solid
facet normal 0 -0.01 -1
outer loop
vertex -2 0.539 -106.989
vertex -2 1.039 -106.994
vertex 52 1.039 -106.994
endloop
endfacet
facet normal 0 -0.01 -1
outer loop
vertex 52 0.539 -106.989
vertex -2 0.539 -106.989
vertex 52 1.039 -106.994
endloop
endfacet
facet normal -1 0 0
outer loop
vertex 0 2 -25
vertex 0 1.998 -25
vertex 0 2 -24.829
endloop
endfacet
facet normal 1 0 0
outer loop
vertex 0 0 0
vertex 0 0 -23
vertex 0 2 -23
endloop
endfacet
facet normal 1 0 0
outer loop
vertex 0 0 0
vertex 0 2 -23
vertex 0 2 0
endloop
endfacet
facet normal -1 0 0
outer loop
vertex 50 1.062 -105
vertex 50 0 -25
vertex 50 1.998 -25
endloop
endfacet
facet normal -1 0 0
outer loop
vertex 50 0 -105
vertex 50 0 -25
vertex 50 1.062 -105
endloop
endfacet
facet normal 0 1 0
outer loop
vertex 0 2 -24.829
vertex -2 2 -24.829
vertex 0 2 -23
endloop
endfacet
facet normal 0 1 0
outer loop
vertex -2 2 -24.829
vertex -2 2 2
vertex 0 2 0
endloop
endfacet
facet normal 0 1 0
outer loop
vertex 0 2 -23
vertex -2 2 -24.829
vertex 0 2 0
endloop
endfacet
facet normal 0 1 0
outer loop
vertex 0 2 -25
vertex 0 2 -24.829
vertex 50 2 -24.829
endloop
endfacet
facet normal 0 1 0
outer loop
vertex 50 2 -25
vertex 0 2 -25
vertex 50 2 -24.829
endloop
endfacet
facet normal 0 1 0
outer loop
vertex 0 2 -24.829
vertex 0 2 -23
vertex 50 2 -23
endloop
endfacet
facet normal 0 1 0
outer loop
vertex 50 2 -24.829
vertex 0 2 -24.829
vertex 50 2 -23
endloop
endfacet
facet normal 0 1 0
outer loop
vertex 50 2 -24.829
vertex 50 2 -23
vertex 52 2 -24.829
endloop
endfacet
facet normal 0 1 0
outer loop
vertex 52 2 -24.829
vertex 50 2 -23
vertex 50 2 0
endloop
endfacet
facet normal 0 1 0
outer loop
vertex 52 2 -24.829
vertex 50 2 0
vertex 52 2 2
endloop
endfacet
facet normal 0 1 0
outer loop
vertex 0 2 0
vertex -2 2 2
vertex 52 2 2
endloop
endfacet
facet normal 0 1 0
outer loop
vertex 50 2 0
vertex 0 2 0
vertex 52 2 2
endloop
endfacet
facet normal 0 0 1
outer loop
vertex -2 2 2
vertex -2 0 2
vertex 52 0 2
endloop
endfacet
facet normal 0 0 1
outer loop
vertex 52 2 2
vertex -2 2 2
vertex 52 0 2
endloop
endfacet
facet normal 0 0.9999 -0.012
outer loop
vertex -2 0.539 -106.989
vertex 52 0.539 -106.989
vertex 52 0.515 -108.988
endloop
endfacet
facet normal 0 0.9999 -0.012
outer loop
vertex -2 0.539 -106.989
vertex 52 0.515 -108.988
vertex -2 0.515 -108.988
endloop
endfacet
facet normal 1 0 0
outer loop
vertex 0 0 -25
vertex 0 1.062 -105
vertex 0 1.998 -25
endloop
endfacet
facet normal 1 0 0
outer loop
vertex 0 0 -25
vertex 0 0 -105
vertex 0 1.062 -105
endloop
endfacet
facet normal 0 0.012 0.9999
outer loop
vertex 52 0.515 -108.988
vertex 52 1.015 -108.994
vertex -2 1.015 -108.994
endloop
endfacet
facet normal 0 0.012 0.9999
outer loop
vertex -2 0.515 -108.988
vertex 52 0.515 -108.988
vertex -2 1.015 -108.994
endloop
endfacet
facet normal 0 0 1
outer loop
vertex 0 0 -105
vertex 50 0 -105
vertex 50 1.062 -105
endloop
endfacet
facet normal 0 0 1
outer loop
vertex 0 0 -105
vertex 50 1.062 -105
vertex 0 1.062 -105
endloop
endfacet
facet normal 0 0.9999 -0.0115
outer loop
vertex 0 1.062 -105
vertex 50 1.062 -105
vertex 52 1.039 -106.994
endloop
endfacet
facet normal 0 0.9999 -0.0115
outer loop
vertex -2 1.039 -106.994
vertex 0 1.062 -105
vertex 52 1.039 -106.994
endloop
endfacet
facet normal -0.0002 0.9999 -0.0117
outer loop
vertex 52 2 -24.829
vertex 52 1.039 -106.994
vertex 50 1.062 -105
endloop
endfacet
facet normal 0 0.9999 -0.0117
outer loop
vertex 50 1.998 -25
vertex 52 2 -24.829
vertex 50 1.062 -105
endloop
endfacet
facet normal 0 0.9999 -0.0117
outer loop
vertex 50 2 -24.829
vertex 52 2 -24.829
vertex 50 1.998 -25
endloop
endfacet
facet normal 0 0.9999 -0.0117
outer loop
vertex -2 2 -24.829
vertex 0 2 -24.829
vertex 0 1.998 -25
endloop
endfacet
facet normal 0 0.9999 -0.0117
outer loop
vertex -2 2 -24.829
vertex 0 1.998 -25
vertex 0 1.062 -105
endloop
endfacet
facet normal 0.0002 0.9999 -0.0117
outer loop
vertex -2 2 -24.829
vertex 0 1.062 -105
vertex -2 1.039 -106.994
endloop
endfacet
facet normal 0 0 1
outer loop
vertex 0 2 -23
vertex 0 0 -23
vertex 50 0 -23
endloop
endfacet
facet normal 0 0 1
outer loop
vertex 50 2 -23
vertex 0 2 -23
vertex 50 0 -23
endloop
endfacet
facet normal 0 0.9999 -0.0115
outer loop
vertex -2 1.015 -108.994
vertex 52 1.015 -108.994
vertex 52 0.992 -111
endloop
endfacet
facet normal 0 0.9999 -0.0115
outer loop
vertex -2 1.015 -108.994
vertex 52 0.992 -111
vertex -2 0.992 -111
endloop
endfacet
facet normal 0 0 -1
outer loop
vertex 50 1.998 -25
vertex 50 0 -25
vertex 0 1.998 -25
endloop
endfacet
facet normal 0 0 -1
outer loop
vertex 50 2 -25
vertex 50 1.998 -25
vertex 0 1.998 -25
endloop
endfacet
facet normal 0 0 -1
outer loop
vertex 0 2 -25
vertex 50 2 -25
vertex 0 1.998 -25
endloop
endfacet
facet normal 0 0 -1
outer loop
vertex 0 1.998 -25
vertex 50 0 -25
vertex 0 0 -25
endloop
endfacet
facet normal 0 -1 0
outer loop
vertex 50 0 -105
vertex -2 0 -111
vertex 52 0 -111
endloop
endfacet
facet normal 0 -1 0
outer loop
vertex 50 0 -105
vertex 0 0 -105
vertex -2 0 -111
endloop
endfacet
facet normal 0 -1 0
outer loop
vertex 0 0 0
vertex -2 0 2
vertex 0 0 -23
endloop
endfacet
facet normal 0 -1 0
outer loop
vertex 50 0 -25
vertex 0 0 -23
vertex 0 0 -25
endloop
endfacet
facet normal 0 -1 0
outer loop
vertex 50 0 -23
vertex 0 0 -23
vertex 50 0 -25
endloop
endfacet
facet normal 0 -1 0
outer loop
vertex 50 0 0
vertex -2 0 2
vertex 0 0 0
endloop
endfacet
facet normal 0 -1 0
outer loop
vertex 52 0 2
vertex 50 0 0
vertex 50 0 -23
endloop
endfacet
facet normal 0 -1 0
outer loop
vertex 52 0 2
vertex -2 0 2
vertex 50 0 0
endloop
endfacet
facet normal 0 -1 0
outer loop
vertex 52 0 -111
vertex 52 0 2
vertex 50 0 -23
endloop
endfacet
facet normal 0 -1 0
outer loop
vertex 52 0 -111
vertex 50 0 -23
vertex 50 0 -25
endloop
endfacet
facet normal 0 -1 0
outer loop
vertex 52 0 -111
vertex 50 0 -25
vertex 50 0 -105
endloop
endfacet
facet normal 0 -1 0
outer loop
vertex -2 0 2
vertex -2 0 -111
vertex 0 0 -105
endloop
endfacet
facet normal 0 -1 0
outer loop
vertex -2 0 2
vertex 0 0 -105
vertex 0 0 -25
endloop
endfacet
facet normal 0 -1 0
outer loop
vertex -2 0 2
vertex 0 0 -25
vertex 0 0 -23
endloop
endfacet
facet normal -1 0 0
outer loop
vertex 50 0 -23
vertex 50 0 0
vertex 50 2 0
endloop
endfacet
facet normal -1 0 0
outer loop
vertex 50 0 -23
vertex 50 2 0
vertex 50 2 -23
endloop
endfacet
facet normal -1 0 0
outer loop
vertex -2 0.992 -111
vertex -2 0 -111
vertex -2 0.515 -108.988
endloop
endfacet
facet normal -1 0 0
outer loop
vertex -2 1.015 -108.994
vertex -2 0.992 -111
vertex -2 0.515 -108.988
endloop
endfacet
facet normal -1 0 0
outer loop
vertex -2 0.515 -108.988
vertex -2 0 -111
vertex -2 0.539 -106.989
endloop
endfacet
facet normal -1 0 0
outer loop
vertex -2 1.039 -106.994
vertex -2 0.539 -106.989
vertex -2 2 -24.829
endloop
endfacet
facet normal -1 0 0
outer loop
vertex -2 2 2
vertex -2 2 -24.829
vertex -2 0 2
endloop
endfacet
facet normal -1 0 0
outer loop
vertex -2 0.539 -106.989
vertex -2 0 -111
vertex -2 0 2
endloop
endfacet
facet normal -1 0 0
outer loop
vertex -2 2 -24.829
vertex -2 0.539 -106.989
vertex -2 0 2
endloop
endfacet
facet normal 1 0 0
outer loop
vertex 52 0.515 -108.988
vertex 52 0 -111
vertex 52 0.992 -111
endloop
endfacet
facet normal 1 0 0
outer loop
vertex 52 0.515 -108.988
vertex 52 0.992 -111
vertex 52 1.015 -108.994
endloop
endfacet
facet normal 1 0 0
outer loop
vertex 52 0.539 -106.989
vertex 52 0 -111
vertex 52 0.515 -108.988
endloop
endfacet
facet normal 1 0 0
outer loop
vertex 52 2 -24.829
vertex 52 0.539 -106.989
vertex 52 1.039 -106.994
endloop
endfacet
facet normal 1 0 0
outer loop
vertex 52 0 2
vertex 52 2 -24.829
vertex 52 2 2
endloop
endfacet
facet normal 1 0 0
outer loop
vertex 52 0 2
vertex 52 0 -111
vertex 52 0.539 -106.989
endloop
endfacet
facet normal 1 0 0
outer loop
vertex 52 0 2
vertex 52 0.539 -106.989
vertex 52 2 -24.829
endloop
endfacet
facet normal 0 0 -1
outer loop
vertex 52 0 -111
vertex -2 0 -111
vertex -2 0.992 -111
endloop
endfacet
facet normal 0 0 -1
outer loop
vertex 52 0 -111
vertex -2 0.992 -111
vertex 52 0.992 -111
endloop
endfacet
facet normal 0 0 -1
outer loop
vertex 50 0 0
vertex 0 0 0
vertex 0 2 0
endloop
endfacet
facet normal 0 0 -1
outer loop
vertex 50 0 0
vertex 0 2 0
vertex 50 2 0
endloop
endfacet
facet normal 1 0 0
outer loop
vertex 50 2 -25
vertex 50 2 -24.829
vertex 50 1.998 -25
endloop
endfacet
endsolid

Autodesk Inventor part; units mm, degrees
ref_plane "YZ Plane" through (0, 0, 0) normal (1, 0, 0) x (0, 1, 0)
ref_plane "XZ Plane" through (0, 0, 0) normal (0, 1, 0) x (-1, 0, 0)
ref_plane "XY Plane" through (0, 0, 0) normal (0, 0, 1) x (1, 0, 0)
sketch "Sketch1" plane through (0, 0, 0) normal (0, 1, 0) x (-1, 0, 0)
  line L0 (0, 0) -> (-50, 0)
  line L1 (-50, 0) -> (-50, -105)
  line L2 (-50, -105) -> (0, -105)
  line L3 (0, -105) -> (0, 0)
  line L4 (2, 2) -> (-52, 2)
  line L5 (-52, 2) -> (-52, -104)
  line L6 (2, -104) -> (2, 2)
  line L7 (2, -104) -> (2, -111)
  line L8 (2, -111) -> (-52, -111)
  line L9 (-52, -111) -> (-52, -102)
  dimension "d0" = 50
  dimension "d1" = 105
  dimension "d23" = 6
  dimension "d24" = 2
extrude "Extrusion1" add sketch "Sketch1" along normal blind 2
ref_plane "Work Plane1" through (45, 2, -25) normal (0, 0.9999, -0.0117) x (-1, 0, 0)
sketch "Sketch3" plane through (45, 2, -25) normal (0, 0.9999, -0.0117) x (-1, 0, 0)
  line L0 (51, 33) -> (-14, 33)
  line L1 (-14, 33) -> (-14, -92)
  line L2 (-14, -92) -> (51, -92)
  line L3 (51, -92) -> (51, 33)
  point P0 (45, 24.9749)
extrude "Extrusion3" cut sketch "Sketch3" along normal blind 2
sketch "Sketch7" plane through (45, 2, -25) normal (0, 0.9999, -0.0117) x (-1, 0, 0)
  line L0 (47, -86.0175) -> (47, 26.9748) projected
  line L1 (47, -82) -> (-7, -82)
  line L2 (-7, -82) -> (-7, -84)
  line L3 (-7, -84) -> (47, -84)
  line L4 (47, -84) -> (47, -82)
  point P0 (45, 24.9749)
extrude "Extrusion6" cut sketch "Sketch7" against normal blind 0.5
sketch "Sketch8" plane through (0, 0, 0) normal (0, -1, 0) x (1, 0, 0)
  line L0 (50, -25) -> (50, 0) construction
  line L1 (50, 0) -> (50, -105) construction
  line L2 (50, -105) -> (50, -25) construction
  line L3 (50, -25) -> (50, -105) projected
  line L4 (50, -25) -> (0, -25)
  line L5 (0, -25) -> (0, -23)
  line L6 (0, -23) -> (50, -23)
  line L7 (50, -23) -> (50, -25)
  point P0 (0, 0)
extrude "Extrusion7" add sketch "Sketch8" against normal blind 2
properties part number "wing1.1"
